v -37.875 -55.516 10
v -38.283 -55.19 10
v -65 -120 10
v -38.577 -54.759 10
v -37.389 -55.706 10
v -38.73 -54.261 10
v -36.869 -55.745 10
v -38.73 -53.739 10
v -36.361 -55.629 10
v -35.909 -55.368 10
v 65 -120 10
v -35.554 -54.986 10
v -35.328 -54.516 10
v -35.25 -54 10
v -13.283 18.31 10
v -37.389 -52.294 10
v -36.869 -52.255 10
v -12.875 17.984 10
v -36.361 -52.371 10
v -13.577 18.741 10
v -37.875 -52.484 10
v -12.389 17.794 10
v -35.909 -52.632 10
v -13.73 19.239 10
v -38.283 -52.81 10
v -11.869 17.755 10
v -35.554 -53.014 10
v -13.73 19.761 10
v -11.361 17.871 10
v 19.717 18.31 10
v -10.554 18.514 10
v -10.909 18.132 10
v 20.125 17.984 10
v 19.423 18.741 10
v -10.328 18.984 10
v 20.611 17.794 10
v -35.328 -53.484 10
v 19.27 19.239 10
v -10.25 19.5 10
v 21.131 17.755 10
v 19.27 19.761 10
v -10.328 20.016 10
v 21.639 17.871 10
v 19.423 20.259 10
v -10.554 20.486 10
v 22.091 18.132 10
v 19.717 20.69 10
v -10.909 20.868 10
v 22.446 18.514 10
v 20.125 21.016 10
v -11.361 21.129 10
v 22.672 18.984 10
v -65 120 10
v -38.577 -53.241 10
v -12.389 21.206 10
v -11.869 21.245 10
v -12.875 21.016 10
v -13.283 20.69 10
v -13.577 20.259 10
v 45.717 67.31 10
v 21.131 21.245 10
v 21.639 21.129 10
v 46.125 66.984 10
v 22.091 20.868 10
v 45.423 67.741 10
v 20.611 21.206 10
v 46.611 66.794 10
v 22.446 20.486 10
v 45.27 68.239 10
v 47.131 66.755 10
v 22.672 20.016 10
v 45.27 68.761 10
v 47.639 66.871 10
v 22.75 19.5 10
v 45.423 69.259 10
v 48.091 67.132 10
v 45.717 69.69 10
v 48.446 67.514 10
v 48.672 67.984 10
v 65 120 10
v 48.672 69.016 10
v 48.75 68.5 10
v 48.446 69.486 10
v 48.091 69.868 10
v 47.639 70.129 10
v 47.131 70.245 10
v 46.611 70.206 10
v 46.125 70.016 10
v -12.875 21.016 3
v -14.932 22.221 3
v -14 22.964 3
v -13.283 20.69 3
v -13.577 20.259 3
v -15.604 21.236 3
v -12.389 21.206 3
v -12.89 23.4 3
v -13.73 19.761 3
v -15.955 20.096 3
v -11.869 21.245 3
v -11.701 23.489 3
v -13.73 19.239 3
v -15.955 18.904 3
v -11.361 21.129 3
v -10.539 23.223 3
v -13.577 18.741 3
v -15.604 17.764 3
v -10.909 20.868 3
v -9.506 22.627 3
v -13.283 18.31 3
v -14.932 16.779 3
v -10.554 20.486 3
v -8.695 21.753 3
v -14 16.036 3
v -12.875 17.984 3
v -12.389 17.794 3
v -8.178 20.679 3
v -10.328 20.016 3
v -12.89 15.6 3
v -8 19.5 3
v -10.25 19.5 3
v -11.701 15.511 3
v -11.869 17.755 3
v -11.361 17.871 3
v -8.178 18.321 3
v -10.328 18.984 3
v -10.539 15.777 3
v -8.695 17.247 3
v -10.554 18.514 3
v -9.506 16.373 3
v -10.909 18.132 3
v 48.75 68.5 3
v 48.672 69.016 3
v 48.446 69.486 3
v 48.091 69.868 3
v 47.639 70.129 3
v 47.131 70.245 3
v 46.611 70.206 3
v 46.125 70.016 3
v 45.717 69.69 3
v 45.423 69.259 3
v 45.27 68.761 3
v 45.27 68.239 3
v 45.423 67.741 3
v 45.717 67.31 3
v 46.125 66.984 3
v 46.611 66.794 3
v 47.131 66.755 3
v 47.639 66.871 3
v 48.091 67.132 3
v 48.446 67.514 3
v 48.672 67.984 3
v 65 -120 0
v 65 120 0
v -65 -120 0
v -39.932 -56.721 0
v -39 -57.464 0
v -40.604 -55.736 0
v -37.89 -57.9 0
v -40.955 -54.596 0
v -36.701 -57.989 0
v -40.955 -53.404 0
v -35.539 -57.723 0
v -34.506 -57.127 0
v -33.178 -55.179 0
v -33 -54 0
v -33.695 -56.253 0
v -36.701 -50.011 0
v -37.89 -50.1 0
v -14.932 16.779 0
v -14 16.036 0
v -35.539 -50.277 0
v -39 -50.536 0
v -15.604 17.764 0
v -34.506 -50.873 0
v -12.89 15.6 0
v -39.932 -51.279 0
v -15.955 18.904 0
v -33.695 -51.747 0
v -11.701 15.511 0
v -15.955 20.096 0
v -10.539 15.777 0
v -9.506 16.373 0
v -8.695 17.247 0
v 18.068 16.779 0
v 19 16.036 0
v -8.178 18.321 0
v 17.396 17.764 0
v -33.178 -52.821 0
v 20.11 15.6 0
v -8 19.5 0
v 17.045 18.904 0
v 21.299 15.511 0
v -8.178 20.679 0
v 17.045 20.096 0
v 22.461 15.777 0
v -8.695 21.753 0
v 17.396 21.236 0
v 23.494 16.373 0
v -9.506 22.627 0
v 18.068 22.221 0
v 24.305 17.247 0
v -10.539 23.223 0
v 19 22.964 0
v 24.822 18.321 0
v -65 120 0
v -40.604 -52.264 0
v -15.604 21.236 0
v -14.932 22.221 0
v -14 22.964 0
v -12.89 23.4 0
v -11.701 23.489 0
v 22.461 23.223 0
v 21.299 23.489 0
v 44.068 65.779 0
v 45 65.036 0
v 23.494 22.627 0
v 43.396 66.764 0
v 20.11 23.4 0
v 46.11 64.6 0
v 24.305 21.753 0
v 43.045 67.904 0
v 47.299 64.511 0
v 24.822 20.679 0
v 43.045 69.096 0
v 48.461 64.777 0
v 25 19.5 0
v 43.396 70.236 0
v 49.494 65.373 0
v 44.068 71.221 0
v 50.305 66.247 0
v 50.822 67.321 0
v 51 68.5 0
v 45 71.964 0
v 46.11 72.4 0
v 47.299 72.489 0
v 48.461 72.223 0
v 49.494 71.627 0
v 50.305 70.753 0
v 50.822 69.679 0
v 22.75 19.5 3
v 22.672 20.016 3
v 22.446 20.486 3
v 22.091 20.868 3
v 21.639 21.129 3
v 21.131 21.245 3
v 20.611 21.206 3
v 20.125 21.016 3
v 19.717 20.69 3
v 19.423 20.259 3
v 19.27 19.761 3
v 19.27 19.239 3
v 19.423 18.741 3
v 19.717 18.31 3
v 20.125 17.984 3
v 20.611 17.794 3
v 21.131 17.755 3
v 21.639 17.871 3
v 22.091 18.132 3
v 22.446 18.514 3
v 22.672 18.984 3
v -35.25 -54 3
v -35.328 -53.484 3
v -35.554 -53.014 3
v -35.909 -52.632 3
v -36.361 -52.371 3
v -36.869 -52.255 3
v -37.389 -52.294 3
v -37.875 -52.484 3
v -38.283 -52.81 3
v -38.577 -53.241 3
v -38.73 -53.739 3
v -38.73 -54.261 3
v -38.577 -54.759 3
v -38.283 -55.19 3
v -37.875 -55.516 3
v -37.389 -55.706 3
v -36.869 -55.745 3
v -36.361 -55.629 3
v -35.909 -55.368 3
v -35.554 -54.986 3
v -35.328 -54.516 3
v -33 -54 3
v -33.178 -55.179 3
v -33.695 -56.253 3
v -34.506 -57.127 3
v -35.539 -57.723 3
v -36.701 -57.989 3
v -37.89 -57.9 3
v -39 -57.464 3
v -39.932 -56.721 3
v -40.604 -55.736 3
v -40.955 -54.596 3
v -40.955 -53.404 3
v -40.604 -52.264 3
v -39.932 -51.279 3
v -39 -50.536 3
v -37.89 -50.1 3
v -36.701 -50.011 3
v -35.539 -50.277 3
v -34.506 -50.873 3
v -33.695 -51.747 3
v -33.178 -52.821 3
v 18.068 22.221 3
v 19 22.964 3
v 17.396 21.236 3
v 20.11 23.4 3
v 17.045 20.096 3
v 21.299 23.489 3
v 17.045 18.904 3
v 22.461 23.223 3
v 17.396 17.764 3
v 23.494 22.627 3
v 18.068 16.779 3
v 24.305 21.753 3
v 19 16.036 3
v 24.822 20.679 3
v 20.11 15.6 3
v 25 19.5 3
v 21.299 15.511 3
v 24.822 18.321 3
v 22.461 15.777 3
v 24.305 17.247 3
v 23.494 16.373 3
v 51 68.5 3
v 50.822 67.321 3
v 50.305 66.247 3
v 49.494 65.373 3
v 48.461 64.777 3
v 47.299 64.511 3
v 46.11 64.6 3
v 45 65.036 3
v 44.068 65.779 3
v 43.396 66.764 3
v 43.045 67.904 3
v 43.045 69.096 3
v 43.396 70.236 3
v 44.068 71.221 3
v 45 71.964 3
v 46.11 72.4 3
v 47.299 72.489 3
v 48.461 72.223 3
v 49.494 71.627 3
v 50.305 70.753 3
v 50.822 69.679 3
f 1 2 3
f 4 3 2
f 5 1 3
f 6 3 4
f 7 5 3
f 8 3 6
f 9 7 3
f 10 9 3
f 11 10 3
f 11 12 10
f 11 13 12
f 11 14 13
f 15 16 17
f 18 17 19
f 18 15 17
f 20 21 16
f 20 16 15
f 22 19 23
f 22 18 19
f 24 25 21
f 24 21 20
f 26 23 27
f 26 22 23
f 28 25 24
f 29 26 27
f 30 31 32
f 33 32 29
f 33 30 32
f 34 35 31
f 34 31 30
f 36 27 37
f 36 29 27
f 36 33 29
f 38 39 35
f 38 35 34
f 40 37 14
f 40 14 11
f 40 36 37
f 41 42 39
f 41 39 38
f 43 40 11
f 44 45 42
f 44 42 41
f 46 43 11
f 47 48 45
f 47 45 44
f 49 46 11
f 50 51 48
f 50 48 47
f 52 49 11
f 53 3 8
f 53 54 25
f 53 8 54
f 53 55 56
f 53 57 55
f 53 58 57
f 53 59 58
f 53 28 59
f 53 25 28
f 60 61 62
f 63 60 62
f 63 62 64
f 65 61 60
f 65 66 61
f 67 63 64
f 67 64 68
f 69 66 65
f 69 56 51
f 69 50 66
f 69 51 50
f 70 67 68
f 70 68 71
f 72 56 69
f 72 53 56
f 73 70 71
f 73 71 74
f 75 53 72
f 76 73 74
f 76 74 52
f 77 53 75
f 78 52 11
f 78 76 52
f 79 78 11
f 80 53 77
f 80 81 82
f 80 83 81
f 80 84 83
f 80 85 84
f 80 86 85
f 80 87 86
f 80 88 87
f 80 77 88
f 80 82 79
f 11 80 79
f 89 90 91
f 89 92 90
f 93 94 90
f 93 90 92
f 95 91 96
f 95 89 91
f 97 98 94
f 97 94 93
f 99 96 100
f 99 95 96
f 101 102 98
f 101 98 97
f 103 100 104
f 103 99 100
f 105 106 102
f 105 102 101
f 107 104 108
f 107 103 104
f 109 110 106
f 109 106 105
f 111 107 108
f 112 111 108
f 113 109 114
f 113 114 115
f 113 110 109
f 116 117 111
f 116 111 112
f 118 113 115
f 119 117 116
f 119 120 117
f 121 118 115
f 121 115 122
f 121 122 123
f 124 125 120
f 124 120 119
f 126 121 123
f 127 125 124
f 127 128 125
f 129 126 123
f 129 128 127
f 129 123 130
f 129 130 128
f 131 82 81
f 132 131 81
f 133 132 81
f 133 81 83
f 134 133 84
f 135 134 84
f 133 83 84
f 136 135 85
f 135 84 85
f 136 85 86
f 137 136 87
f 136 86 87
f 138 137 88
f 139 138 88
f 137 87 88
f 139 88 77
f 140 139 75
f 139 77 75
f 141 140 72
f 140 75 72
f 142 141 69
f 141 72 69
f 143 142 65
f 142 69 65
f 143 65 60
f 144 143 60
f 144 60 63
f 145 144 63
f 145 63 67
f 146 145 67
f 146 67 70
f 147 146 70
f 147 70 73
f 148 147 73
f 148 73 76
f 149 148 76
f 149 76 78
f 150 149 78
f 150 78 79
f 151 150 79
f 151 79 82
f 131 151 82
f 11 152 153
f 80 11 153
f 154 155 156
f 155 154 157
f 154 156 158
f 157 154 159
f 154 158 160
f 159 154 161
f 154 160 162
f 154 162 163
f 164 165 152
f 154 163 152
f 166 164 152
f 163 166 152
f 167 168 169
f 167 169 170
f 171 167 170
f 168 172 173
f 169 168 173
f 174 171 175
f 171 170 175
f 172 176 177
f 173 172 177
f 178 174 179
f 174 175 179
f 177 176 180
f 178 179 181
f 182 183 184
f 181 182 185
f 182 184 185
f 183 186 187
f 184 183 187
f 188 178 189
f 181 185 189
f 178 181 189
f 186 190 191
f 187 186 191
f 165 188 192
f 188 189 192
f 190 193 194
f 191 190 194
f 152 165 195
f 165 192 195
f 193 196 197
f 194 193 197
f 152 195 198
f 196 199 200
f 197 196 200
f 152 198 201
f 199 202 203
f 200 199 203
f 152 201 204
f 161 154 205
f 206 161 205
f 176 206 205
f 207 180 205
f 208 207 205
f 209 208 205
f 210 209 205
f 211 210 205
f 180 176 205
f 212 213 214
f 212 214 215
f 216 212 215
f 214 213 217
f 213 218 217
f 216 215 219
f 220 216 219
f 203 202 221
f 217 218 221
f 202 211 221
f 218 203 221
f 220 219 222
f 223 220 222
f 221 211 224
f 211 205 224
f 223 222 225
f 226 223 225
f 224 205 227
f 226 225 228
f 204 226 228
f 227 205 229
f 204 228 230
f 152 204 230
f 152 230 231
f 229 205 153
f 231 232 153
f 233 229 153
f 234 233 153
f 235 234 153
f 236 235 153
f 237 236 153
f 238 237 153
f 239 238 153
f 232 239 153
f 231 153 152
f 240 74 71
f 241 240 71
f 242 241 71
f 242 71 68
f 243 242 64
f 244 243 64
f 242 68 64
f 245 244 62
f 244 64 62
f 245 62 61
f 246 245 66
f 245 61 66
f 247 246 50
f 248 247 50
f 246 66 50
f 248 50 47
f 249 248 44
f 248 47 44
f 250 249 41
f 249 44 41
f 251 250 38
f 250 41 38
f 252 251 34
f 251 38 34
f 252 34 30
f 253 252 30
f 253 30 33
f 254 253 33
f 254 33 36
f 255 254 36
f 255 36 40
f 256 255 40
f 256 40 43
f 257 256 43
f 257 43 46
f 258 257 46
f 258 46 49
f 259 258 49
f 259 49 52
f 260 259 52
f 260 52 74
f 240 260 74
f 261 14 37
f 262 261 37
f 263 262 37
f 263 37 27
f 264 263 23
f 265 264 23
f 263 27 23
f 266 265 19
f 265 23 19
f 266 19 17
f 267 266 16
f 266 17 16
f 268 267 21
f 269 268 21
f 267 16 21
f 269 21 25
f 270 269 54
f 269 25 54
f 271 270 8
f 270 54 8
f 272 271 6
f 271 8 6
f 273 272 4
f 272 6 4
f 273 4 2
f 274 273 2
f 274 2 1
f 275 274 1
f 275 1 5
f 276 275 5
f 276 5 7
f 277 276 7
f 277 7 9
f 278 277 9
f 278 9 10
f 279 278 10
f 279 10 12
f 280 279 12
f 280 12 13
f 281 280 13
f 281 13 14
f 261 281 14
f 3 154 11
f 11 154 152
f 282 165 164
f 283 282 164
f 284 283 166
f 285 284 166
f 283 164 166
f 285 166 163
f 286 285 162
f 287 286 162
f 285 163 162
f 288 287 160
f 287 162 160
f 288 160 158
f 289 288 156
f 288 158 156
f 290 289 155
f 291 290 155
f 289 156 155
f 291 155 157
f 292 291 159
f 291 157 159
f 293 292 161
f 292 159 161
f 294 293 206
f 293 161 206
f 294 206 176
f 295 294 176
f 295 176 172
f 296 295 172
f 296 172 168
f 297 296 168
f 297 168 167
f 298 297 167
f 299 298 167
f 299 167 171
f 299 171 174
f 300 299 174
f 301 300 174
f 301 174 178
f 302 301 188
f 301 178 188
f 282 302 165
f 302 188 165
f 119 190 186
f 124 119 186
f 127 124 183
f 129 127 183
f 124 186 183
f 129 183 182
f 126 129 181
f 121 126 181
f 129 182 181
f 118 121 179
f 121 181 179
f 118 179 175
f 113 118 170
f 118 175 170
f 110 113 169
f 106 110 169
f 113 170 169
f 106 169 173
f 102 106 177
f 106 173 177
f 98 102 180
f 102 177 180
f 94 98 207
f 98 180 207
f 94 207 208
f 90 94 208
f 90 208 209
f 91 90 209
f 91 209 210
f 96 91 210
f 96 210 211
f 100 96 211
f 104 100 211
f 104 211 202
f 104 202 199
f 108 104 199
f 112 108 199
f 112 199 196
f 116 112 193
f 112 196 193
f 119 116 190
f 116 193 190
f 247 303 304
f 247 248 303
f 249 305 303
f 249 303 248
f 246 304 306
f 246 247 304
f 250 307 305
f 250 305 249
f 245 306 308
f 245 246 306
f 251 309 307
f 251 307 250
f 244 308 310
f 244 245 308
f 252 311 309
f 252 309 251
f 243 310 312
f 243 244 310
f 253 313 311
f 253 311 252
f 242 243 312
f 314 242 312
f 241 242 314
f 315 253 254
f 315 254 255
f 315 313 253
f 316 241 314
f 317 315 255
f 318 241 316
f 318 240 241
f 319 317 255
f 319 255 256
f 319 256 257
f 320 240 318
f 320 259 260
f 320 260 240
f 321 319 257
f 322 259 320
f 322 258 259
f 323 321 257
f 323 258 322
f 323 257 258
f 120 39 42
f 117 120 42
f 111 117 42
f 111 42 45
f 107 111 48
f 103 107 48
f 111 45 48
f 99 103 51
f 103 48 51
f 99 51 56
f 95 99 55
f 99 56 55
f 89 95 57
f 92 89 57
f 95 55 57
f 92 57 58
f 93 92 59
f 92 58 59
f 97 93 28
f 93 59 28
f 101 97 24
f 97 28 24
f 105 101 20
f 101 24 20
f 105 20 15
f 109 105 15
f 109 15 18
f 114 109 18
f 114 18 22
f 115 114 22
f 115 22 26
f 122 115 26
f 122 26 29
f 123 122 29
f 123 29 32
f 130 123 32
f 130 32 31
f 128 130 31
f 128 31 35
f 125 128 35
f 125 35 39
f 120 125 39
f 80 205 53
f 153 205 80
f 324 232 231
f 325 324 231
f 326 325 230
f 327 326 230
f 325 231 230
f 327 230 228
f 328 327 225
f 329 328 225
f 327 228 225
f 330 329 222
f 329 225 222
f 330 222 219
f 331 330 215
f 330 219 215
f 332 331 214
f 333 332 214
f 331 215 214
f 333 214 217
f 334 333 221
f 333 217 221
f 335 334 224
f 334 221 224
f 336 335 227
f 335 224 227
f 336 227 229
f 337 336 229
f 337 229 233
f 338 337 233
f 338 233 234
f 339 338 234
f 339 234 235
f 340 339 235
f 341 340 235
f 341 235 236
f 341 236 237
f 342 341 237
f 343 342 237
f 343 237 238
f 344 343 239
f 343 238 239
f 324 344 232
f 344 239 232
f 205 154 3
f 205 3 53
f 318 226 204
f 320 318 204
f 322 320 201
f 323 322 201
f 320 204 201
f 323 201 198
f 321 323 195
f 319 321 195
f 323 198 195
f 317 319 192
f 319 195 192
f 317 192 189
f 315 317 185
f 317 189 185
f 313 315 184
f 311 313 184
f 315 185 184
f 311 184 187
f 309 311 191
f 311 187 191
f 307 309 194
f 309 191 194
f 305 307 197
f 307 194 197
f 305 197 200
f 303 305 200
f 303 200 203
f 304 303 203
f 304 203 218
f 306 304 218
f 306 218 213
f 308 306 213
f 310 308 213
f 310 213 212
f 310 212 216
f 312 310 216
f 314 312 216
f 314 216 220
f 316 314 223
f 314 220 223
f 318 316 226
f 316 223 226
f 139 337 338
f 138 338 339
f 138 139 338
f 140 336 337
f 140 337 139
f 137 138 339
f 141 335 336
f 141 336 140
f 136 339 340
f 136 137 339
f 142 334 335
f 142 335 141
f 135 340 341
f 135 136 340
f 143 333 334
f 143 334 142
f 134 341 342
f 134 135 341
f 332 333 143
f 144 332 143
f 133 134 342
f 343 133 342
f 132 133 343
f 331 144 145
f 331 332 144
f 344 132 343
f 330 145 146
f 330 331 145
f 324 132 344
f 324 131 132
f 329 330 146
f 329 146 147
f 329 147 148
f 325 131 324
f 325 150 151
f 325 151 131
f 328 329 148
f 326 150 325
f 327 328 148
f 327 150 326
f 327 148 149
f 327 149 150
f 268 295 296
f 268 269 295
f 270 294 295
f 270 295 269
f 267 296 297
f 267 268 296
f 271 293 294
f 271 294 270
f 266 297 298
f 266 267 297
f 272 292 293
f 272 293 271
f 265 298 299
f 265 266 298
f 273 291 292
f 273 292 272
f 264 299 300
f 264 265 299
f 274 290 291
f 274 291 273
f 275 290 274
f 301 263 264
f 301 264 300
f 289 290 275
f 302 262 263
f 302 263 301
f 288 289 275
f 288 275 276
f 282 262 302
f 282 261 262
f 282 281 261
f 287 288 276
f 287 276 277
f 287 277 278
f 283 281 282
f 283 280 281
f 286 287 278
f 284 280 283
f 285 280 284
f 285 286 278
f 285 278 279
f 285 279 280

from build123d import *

# Parameters (mm, degrees)
SKETCH_W             = 130
SKETCH_H             = 240
PAD_DEPTH            = 10
SKETCH015_R          = 1.75
POCKET008_DEPTH      = 10.001
POCKET008_DEPTH_BACK = 0.001
SKETCH016_R          = 4
POCKET009_DEPTH      = 3


with BuildPart() as part:
    # Sketch → Pad (new body)
    with BuildSketch(Plane.XY):
        Rectangle(SKETCH_W, SKETCH_H)
    extrude(amount=PAD_DEPTH)

    # Sketch015 (on Face6 of Pad) → Pocket008 (cut, two sides)
    with BuildSketch(Plane.XY.offset(10)) as pocket008_sk:
        with Locations((47, 68.5)):
            Circle(SKETCH015_R)
        with Locations((21, 19.5)):
            Circle(SKETCH015_R)
        with Locations((-12, 19.5)):
            Circle(SKETCH015_R)
        with Locations((-37, -54)):
            Circle(SKETCH015_R)
    extrude(amount=-POCKET008_DEPTH, mode=Mode.SUBTRACT)
    extrude(pocket008_sk.sketch, amount=POCKET008_DEPTH_BACK, mode=Mode.SUBTRACT)

    # Sketch016 (on Face4 of Pocket008) → Pocket009 (cut)
    with BuildSketch(Plane(origin=(0, 0, 0), x_dir=(1, 0, 0), z_dir=(0, 0, -1))):
        with Locations((-37, 54)):
            Circle(SKETCH016_R)
        with Locations((-12, -19.5)):
            Circle(SKETCH016_R)
        with Locations((21, -19.5)):
            Circle(SKETCH016_R)
        with Locations((47, -68.5)):
            Circle(SKETCH016_R)
    extrude(amount=-POCKET009_DEPTH, mode=Mode.SUBTRACT)


solid = part.part
